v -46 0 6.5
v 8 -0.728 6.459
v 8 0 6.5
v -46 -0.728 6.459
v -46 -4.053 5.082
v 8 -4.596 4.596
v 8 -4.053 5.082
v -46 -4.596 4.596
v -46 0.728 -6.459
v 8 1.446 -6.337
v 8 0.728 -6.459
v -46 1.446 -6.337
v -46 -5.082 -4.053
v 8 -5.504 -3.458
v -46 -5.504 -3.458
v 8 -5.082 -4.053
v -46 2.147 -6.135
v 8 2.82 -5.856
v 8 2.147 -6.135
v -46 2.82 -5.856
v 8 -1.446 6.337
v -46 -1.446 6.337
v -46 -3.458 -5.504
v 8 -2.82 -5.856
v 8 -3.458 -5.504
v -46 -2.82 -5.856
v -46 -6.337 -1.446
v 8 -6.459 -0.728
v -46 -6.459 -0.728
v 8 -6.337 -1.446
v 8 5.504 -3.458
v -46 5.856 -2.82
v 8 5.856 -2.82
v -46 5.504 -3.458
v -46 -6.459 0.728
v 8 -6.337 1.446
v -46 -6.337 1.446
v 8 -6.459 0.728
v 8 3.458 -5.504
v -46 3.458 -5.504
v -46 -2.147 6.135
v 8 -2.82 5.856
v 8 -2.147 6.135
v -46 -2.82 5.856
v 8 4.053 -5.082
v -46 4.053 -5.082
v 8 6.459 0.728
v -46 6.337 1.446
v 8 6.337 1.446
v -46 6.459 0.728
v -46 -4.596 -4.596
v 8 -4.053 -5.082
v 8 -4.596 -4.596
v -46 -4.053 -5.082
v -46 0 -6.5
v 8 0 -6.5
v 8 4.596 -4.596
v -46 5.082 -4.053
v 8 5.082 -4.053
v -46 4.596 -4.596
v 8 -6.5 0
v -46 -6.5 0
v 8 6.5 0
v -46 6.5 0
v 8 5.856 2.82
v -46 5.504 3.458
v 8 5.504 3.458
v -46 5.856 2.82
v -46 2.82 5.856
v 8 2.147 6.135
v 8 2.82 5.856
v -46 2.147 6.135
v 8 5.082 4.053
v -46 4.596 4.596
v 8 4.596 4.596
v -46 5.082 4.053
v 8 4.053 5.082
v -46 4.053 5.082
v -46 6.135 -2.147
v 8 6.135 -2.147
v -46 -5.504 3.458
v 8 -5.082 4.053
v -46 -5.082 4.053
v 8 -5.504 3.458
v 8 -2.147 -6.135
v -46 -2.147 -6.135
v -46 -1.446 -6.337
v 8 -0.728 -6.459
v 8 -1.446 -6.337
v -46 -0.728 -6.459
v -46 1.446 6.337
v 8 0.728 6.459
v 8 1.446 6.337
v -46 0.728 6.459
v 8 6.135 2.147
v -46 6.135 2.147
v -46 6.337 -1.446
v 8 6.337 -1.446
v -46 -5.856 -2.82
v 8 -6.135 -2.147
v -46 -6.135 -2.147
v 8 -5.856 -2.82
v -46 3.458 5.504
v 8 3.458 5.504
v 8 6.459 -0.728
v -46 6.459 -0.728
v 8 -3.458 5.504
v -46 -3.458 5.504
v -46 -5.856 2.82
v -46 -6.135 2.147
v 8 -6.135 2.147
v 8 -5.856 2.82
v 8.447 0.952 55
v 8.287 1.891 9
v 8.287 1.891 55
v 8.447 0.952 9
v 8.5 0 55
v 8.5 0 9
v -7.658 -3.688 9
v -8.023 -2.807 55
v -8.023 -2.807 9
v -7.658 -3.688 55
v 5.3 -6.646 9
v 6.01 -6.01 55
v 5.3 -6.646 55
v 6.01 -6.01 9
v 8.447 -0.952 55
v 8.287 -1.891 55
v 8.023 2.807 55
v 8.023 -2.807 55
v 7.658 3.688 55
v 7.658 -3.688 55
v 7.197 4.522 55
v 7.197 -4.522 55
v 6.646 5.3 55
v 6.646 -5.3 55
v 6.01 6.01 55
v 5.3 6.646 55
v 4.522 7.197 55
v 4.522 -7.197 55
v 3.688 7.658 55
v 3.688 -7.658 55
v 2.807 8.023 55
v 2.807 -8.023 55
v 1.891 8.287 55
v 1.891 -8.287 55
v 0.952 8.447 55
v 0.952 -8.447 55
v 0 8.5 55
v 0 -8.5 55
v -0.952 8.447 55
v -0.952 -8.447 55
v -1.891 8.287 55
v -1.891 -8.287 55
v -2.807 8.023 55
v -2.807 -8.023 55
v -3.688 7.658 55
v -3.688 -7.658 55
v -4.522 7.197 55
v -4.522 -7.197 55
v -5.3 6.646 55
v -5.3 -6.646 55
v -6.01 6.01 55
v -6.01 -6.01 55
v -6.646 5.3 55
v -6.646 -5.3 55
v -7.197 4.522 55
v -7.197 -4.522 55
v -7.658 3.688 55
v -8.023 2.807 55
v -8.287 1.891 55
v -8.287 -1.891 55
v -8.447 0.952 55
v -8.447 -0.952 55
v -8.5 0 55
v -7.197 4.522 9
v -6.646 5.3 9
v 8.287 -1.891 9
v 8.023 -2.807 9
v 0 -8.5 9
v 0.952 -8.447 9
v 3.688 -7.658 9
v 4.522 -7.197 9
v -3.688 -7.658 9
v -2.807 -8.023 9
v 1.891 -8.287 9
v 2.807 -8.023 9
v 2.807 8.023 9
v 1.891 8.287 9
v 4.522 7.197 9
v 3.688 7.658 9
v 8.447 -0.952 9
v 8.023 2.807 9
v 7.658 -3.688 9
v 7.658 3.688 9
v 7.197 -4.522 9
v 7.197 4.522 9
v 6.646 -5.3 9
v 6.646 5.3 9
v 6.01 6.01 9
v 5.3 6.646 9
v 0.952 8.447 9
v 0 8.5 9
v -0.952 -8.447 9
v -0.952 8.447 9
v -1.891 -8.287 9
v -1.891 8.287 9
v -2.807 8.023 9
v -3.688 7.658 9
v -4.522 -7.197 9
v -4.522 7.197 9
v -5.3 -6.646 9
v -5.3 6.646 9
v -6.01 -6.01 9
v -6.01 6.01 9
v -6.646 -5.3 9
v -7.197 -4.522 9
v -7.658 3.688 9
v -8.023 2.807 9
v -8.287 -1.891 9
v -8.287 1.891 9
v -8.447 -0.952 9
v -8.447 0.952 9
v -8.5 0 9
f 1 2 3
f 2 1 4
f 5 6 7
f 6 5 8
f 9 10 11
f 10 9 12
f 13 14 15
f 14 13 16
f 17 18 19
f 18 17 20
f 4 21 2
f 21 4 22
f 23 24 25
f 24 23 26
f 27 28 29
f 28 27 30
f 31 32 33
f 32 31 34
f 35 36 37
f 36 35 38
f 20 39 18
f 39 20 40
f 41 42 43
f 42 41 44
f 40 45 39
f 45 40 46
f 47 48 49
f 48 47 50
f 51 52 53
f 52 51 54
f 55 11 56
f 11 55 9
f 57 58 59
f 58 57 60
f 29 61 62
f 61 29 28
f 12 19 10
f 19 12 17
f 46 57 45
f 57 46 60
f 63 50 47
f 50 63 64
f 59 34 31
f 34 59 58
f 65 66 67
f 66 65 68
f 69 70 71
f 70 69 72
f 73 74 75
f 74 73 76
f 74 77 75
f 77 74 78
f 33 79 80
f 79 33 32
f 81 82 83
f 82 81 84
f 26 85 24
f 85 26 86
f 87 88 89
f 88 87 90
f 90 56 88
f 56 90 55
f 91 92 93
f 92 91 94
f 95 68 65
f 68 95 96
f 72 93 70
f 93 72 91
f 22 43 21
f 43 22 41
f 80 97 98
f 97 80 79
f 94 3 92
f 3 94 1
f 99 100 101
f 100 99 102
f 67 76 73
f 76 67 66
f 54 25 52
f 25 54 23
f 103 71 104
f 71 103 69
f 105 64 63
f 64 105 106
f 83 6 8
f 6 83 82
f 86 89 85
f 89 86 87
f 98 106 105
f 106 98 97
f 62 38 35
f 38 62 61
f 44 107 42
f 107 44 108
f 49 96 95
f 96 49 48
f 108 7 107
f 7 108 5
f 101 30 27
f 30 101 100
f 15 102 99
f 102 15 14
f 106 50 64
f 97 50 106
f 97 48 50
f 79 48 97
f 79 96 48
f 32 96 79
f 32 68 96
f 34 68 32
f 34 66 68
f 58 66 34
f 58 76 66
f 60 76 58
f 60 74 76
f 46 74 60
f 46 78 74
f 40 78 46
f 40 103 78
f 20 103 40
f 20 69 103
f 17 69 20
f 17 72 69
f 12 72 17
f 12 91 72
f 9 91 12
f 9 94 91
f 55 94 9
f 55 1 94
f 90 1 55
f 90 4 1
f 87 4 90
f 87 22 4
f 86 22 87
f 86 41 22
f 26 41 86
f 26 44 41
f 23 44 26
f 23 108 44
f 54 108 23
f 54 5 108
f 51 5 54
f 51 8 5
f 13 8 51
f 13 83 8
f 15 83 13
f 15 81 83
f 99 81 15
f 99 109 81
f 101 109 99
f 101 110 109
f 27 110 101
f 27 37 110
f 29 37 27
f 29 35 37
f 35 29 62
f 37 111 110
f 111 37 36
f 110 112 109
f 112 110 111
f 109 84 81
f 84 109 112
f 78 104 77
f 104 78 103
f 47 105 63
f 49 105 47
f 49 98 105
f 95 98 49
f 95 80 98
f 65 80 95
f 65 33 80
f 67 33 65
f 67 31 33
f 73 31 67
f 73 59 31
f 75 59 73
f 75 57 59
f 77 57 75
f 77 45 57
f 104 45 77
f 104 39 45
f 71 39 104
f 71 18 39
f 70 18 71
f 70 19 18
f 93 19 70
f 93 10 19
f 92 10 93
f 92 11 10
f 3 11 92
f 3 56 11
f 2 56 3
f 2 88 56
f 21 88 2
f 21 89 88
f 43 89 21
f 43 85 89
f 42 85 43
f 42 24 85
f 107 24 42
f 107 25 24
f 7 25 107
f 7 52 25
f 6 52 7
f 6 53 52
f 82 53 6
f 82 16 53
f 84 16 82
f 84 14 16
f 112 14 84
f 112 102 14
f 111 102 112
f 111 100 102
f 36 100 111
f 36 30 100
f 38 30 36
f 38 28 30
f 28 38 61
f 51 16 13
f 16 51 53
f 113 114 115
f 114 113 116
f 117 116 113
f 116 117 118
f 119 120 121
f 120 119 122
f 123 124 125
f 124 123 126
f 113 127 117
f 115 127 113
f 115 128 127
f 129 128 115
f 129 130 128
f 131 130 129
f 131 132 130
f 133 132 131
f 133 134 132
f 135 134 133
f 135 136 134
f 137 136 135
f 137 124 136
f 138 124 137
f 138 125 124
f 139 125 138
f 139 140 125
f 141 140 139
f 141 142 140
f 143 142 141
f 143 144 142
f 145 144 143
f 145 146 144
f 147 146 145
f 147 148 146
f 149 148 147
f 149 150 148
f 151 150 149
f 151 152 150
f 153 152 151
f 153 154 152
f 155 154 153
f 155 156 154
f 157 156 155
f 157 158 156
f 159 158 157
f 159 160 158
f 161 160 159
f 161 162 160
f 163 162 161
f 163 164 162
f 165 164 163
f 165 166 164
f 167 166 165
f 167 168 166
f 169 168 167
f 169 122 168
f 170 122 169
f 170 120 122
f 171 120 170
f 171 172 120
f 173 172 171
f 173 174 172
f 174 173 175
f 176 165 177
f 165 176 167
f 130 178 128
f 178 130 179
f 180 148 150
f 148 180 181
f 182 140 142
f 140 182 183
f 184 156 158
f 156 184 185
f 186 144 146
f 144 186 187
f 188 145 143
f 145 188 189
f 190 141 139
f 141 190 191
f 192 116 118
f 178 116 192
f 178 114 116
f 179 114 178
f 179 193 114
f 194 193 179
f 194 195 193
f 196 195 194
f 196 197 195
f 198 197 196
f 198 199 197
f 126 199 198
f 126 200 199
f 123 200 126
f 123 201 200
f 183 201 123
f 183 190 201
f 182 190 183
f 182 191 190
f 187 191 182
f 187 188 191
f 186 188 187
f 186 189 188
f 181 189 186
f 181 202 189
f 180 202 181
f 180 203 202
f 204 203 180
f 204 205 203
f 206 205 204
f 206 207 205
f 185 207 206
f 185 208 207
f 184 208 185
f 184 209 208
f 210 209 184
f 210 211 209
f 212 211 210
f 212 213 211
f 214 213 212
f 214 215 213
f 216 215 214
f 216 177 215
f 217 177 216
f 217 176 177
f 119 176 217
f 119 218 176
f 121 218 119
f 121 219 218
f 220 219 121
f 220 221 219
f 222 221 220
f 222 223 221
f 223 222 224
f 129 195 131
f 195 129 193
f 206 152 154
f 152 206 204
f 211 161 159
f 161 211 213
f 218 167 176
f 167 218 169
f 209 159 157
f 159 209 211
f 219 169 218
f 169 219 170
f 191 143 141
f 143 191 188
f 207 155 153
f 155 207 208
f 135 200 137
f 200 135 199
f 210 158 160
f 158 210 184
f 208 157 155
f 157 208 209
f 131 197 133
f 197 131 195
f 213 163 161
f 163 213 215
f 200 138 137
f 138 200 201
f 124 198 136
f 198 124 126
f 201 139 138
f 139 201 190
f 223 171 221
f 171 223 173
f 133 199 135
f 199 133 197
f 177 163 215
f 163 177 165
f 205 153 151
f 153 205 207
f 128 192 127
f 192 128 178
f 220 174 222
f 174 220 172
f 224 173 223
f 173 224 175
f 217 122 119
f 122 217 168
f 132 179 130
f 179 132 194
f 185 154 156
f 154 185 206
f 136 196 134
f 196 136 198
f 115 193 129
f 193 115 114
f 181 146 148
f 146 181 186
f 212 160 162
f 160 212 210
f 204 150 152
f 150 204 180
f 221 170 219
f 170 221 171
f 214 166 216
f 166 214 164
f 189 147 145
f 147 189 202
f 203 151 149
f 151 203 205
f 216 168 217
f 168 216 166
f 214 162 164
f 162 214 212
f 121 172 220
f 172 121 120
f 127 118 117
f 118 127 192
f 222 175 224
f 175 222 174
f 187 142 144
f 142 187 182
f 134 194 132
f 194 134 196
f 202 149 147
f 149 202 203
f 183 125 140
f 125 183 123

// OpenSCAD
include <gears.scad>
// ===================================================================
//  Spiral bevel pair, 2:1, 90 degree shafts
//
//  Phasing: the two members touch along the shared cone element, which
//  lies at azimuth 0 in the wheel's own frame and -- after
//  rotate([0,90,0]) swings the pinion's axis onto +x, mapping its
//  local +x to world -z -- at azimuth 180 in the pinion's.  So the
//  wheel wants a tooth centreline there and the pinion a space, which
//  is half a pitch further round.  The spiral offset is zero at
//  mid-face by construction, so those two conditions are enough.
// ===================================================================

M    = 3.0;
Z1   = 34;           // wheel
Z2   = 17;           // pinion
PSI  = 35;           // mean spiral angle -- the Gleason standard
AL   = 20;

G1   = bev_gamma(Z1,Z2);          // 63.435
G2   = bev_gamma(Z2,Z1);          // 26.565
LO   = bev_Lo(M,Z1,G1);           // both members share this
LI   = 0.68*LO;                   // face width 0.32 Lo, inside the Lo/3 rule
LM   = (LO+LI)/2;
RC   = 0.99*LM;                   // face-mill cutter radius
LH1  = 0.32*LO;                   // where the wheel dish meets its hub
LH2  = 0.30*LO;
T1   = 6.0;                       // dish thickness
T2   = 6.0;
ZB1  = 9;                         // wheel back face -- kept clear of the
ZB2  = 8;                         // pinion shaft, which runs through the
RH1  = 13; RH2 = 10;              // apex on its way out the far side

PH1  = 0;                         // ph places a TOOTH centreline, so the
PH2  = 180 + 180/Z2;              // wheel gets a tooth on the common cone
                                  // element and the pinion a space -- half
                                  // a pitch past its own azimuth 180

echo("cone angles", G1, G2, " sum =", G1+G2);
echo("Lo", LO, "Li", LI, "face width", LO-LI, "=", (LO-LI)/LO, "of Lo");
echo("cutter radius", RC, "rho =", sb_rho(LM,RC,PSI));
echo("face contact ratio wheel  =",
     sb_face_ratio(LO,LI,LM,sb_rho(LM,RC,PSI),RC,G1,Z1));
echo("face contact ratio pinion =",
     sb_face_ratio(LO,LI,LM,sb_rho(LM,RC,PSI),RC,G2,Z2));
echo("ratio =", Z1/Z2);

WHEEL = [0.82, 0.68, 0.34];
PIN   = [0.46, 0.62, 0.72];
BODY  = [0.46, 0.49, 0.54];
SHAFT = [0.34, 0.37, 0.41];

// ---- wheel: axis +z, left hand -------------------------------------
color(WHEEL) bevel_spiral(M, Z1, G1, LO, LI, RC, PSI, AL, PH1,  1);
color(BODY)  bev_blank(M, Z1, G1, LO, LH1, T1, RH1, ZB1, 4.5);
// the wheel is driven from ABOVE: its shaft cannot come down through
// the apex, because that is where the pinion's shaft goes
color(SHAFT) translate([0,0,ZB1]) cylinder(h=46, r=8.5, $fn=56);

// ---- pinion: axis +x, right hand -----------------------------------
rotate([0,90,0]) {
    color(PIN)   bevel_spiral(M, Z2, G2, LO, LI, RC, PSI, AL, PH2, -1);
    color(BODY)  bev_blank(M, Z2, G2, LO, LH2, T2, RH2, ZB2, 3.5);
    color(SHAFT) translate([0,0,-46]) cylinder(h=46+ZB2, r=6.5, $fn=56);
}
